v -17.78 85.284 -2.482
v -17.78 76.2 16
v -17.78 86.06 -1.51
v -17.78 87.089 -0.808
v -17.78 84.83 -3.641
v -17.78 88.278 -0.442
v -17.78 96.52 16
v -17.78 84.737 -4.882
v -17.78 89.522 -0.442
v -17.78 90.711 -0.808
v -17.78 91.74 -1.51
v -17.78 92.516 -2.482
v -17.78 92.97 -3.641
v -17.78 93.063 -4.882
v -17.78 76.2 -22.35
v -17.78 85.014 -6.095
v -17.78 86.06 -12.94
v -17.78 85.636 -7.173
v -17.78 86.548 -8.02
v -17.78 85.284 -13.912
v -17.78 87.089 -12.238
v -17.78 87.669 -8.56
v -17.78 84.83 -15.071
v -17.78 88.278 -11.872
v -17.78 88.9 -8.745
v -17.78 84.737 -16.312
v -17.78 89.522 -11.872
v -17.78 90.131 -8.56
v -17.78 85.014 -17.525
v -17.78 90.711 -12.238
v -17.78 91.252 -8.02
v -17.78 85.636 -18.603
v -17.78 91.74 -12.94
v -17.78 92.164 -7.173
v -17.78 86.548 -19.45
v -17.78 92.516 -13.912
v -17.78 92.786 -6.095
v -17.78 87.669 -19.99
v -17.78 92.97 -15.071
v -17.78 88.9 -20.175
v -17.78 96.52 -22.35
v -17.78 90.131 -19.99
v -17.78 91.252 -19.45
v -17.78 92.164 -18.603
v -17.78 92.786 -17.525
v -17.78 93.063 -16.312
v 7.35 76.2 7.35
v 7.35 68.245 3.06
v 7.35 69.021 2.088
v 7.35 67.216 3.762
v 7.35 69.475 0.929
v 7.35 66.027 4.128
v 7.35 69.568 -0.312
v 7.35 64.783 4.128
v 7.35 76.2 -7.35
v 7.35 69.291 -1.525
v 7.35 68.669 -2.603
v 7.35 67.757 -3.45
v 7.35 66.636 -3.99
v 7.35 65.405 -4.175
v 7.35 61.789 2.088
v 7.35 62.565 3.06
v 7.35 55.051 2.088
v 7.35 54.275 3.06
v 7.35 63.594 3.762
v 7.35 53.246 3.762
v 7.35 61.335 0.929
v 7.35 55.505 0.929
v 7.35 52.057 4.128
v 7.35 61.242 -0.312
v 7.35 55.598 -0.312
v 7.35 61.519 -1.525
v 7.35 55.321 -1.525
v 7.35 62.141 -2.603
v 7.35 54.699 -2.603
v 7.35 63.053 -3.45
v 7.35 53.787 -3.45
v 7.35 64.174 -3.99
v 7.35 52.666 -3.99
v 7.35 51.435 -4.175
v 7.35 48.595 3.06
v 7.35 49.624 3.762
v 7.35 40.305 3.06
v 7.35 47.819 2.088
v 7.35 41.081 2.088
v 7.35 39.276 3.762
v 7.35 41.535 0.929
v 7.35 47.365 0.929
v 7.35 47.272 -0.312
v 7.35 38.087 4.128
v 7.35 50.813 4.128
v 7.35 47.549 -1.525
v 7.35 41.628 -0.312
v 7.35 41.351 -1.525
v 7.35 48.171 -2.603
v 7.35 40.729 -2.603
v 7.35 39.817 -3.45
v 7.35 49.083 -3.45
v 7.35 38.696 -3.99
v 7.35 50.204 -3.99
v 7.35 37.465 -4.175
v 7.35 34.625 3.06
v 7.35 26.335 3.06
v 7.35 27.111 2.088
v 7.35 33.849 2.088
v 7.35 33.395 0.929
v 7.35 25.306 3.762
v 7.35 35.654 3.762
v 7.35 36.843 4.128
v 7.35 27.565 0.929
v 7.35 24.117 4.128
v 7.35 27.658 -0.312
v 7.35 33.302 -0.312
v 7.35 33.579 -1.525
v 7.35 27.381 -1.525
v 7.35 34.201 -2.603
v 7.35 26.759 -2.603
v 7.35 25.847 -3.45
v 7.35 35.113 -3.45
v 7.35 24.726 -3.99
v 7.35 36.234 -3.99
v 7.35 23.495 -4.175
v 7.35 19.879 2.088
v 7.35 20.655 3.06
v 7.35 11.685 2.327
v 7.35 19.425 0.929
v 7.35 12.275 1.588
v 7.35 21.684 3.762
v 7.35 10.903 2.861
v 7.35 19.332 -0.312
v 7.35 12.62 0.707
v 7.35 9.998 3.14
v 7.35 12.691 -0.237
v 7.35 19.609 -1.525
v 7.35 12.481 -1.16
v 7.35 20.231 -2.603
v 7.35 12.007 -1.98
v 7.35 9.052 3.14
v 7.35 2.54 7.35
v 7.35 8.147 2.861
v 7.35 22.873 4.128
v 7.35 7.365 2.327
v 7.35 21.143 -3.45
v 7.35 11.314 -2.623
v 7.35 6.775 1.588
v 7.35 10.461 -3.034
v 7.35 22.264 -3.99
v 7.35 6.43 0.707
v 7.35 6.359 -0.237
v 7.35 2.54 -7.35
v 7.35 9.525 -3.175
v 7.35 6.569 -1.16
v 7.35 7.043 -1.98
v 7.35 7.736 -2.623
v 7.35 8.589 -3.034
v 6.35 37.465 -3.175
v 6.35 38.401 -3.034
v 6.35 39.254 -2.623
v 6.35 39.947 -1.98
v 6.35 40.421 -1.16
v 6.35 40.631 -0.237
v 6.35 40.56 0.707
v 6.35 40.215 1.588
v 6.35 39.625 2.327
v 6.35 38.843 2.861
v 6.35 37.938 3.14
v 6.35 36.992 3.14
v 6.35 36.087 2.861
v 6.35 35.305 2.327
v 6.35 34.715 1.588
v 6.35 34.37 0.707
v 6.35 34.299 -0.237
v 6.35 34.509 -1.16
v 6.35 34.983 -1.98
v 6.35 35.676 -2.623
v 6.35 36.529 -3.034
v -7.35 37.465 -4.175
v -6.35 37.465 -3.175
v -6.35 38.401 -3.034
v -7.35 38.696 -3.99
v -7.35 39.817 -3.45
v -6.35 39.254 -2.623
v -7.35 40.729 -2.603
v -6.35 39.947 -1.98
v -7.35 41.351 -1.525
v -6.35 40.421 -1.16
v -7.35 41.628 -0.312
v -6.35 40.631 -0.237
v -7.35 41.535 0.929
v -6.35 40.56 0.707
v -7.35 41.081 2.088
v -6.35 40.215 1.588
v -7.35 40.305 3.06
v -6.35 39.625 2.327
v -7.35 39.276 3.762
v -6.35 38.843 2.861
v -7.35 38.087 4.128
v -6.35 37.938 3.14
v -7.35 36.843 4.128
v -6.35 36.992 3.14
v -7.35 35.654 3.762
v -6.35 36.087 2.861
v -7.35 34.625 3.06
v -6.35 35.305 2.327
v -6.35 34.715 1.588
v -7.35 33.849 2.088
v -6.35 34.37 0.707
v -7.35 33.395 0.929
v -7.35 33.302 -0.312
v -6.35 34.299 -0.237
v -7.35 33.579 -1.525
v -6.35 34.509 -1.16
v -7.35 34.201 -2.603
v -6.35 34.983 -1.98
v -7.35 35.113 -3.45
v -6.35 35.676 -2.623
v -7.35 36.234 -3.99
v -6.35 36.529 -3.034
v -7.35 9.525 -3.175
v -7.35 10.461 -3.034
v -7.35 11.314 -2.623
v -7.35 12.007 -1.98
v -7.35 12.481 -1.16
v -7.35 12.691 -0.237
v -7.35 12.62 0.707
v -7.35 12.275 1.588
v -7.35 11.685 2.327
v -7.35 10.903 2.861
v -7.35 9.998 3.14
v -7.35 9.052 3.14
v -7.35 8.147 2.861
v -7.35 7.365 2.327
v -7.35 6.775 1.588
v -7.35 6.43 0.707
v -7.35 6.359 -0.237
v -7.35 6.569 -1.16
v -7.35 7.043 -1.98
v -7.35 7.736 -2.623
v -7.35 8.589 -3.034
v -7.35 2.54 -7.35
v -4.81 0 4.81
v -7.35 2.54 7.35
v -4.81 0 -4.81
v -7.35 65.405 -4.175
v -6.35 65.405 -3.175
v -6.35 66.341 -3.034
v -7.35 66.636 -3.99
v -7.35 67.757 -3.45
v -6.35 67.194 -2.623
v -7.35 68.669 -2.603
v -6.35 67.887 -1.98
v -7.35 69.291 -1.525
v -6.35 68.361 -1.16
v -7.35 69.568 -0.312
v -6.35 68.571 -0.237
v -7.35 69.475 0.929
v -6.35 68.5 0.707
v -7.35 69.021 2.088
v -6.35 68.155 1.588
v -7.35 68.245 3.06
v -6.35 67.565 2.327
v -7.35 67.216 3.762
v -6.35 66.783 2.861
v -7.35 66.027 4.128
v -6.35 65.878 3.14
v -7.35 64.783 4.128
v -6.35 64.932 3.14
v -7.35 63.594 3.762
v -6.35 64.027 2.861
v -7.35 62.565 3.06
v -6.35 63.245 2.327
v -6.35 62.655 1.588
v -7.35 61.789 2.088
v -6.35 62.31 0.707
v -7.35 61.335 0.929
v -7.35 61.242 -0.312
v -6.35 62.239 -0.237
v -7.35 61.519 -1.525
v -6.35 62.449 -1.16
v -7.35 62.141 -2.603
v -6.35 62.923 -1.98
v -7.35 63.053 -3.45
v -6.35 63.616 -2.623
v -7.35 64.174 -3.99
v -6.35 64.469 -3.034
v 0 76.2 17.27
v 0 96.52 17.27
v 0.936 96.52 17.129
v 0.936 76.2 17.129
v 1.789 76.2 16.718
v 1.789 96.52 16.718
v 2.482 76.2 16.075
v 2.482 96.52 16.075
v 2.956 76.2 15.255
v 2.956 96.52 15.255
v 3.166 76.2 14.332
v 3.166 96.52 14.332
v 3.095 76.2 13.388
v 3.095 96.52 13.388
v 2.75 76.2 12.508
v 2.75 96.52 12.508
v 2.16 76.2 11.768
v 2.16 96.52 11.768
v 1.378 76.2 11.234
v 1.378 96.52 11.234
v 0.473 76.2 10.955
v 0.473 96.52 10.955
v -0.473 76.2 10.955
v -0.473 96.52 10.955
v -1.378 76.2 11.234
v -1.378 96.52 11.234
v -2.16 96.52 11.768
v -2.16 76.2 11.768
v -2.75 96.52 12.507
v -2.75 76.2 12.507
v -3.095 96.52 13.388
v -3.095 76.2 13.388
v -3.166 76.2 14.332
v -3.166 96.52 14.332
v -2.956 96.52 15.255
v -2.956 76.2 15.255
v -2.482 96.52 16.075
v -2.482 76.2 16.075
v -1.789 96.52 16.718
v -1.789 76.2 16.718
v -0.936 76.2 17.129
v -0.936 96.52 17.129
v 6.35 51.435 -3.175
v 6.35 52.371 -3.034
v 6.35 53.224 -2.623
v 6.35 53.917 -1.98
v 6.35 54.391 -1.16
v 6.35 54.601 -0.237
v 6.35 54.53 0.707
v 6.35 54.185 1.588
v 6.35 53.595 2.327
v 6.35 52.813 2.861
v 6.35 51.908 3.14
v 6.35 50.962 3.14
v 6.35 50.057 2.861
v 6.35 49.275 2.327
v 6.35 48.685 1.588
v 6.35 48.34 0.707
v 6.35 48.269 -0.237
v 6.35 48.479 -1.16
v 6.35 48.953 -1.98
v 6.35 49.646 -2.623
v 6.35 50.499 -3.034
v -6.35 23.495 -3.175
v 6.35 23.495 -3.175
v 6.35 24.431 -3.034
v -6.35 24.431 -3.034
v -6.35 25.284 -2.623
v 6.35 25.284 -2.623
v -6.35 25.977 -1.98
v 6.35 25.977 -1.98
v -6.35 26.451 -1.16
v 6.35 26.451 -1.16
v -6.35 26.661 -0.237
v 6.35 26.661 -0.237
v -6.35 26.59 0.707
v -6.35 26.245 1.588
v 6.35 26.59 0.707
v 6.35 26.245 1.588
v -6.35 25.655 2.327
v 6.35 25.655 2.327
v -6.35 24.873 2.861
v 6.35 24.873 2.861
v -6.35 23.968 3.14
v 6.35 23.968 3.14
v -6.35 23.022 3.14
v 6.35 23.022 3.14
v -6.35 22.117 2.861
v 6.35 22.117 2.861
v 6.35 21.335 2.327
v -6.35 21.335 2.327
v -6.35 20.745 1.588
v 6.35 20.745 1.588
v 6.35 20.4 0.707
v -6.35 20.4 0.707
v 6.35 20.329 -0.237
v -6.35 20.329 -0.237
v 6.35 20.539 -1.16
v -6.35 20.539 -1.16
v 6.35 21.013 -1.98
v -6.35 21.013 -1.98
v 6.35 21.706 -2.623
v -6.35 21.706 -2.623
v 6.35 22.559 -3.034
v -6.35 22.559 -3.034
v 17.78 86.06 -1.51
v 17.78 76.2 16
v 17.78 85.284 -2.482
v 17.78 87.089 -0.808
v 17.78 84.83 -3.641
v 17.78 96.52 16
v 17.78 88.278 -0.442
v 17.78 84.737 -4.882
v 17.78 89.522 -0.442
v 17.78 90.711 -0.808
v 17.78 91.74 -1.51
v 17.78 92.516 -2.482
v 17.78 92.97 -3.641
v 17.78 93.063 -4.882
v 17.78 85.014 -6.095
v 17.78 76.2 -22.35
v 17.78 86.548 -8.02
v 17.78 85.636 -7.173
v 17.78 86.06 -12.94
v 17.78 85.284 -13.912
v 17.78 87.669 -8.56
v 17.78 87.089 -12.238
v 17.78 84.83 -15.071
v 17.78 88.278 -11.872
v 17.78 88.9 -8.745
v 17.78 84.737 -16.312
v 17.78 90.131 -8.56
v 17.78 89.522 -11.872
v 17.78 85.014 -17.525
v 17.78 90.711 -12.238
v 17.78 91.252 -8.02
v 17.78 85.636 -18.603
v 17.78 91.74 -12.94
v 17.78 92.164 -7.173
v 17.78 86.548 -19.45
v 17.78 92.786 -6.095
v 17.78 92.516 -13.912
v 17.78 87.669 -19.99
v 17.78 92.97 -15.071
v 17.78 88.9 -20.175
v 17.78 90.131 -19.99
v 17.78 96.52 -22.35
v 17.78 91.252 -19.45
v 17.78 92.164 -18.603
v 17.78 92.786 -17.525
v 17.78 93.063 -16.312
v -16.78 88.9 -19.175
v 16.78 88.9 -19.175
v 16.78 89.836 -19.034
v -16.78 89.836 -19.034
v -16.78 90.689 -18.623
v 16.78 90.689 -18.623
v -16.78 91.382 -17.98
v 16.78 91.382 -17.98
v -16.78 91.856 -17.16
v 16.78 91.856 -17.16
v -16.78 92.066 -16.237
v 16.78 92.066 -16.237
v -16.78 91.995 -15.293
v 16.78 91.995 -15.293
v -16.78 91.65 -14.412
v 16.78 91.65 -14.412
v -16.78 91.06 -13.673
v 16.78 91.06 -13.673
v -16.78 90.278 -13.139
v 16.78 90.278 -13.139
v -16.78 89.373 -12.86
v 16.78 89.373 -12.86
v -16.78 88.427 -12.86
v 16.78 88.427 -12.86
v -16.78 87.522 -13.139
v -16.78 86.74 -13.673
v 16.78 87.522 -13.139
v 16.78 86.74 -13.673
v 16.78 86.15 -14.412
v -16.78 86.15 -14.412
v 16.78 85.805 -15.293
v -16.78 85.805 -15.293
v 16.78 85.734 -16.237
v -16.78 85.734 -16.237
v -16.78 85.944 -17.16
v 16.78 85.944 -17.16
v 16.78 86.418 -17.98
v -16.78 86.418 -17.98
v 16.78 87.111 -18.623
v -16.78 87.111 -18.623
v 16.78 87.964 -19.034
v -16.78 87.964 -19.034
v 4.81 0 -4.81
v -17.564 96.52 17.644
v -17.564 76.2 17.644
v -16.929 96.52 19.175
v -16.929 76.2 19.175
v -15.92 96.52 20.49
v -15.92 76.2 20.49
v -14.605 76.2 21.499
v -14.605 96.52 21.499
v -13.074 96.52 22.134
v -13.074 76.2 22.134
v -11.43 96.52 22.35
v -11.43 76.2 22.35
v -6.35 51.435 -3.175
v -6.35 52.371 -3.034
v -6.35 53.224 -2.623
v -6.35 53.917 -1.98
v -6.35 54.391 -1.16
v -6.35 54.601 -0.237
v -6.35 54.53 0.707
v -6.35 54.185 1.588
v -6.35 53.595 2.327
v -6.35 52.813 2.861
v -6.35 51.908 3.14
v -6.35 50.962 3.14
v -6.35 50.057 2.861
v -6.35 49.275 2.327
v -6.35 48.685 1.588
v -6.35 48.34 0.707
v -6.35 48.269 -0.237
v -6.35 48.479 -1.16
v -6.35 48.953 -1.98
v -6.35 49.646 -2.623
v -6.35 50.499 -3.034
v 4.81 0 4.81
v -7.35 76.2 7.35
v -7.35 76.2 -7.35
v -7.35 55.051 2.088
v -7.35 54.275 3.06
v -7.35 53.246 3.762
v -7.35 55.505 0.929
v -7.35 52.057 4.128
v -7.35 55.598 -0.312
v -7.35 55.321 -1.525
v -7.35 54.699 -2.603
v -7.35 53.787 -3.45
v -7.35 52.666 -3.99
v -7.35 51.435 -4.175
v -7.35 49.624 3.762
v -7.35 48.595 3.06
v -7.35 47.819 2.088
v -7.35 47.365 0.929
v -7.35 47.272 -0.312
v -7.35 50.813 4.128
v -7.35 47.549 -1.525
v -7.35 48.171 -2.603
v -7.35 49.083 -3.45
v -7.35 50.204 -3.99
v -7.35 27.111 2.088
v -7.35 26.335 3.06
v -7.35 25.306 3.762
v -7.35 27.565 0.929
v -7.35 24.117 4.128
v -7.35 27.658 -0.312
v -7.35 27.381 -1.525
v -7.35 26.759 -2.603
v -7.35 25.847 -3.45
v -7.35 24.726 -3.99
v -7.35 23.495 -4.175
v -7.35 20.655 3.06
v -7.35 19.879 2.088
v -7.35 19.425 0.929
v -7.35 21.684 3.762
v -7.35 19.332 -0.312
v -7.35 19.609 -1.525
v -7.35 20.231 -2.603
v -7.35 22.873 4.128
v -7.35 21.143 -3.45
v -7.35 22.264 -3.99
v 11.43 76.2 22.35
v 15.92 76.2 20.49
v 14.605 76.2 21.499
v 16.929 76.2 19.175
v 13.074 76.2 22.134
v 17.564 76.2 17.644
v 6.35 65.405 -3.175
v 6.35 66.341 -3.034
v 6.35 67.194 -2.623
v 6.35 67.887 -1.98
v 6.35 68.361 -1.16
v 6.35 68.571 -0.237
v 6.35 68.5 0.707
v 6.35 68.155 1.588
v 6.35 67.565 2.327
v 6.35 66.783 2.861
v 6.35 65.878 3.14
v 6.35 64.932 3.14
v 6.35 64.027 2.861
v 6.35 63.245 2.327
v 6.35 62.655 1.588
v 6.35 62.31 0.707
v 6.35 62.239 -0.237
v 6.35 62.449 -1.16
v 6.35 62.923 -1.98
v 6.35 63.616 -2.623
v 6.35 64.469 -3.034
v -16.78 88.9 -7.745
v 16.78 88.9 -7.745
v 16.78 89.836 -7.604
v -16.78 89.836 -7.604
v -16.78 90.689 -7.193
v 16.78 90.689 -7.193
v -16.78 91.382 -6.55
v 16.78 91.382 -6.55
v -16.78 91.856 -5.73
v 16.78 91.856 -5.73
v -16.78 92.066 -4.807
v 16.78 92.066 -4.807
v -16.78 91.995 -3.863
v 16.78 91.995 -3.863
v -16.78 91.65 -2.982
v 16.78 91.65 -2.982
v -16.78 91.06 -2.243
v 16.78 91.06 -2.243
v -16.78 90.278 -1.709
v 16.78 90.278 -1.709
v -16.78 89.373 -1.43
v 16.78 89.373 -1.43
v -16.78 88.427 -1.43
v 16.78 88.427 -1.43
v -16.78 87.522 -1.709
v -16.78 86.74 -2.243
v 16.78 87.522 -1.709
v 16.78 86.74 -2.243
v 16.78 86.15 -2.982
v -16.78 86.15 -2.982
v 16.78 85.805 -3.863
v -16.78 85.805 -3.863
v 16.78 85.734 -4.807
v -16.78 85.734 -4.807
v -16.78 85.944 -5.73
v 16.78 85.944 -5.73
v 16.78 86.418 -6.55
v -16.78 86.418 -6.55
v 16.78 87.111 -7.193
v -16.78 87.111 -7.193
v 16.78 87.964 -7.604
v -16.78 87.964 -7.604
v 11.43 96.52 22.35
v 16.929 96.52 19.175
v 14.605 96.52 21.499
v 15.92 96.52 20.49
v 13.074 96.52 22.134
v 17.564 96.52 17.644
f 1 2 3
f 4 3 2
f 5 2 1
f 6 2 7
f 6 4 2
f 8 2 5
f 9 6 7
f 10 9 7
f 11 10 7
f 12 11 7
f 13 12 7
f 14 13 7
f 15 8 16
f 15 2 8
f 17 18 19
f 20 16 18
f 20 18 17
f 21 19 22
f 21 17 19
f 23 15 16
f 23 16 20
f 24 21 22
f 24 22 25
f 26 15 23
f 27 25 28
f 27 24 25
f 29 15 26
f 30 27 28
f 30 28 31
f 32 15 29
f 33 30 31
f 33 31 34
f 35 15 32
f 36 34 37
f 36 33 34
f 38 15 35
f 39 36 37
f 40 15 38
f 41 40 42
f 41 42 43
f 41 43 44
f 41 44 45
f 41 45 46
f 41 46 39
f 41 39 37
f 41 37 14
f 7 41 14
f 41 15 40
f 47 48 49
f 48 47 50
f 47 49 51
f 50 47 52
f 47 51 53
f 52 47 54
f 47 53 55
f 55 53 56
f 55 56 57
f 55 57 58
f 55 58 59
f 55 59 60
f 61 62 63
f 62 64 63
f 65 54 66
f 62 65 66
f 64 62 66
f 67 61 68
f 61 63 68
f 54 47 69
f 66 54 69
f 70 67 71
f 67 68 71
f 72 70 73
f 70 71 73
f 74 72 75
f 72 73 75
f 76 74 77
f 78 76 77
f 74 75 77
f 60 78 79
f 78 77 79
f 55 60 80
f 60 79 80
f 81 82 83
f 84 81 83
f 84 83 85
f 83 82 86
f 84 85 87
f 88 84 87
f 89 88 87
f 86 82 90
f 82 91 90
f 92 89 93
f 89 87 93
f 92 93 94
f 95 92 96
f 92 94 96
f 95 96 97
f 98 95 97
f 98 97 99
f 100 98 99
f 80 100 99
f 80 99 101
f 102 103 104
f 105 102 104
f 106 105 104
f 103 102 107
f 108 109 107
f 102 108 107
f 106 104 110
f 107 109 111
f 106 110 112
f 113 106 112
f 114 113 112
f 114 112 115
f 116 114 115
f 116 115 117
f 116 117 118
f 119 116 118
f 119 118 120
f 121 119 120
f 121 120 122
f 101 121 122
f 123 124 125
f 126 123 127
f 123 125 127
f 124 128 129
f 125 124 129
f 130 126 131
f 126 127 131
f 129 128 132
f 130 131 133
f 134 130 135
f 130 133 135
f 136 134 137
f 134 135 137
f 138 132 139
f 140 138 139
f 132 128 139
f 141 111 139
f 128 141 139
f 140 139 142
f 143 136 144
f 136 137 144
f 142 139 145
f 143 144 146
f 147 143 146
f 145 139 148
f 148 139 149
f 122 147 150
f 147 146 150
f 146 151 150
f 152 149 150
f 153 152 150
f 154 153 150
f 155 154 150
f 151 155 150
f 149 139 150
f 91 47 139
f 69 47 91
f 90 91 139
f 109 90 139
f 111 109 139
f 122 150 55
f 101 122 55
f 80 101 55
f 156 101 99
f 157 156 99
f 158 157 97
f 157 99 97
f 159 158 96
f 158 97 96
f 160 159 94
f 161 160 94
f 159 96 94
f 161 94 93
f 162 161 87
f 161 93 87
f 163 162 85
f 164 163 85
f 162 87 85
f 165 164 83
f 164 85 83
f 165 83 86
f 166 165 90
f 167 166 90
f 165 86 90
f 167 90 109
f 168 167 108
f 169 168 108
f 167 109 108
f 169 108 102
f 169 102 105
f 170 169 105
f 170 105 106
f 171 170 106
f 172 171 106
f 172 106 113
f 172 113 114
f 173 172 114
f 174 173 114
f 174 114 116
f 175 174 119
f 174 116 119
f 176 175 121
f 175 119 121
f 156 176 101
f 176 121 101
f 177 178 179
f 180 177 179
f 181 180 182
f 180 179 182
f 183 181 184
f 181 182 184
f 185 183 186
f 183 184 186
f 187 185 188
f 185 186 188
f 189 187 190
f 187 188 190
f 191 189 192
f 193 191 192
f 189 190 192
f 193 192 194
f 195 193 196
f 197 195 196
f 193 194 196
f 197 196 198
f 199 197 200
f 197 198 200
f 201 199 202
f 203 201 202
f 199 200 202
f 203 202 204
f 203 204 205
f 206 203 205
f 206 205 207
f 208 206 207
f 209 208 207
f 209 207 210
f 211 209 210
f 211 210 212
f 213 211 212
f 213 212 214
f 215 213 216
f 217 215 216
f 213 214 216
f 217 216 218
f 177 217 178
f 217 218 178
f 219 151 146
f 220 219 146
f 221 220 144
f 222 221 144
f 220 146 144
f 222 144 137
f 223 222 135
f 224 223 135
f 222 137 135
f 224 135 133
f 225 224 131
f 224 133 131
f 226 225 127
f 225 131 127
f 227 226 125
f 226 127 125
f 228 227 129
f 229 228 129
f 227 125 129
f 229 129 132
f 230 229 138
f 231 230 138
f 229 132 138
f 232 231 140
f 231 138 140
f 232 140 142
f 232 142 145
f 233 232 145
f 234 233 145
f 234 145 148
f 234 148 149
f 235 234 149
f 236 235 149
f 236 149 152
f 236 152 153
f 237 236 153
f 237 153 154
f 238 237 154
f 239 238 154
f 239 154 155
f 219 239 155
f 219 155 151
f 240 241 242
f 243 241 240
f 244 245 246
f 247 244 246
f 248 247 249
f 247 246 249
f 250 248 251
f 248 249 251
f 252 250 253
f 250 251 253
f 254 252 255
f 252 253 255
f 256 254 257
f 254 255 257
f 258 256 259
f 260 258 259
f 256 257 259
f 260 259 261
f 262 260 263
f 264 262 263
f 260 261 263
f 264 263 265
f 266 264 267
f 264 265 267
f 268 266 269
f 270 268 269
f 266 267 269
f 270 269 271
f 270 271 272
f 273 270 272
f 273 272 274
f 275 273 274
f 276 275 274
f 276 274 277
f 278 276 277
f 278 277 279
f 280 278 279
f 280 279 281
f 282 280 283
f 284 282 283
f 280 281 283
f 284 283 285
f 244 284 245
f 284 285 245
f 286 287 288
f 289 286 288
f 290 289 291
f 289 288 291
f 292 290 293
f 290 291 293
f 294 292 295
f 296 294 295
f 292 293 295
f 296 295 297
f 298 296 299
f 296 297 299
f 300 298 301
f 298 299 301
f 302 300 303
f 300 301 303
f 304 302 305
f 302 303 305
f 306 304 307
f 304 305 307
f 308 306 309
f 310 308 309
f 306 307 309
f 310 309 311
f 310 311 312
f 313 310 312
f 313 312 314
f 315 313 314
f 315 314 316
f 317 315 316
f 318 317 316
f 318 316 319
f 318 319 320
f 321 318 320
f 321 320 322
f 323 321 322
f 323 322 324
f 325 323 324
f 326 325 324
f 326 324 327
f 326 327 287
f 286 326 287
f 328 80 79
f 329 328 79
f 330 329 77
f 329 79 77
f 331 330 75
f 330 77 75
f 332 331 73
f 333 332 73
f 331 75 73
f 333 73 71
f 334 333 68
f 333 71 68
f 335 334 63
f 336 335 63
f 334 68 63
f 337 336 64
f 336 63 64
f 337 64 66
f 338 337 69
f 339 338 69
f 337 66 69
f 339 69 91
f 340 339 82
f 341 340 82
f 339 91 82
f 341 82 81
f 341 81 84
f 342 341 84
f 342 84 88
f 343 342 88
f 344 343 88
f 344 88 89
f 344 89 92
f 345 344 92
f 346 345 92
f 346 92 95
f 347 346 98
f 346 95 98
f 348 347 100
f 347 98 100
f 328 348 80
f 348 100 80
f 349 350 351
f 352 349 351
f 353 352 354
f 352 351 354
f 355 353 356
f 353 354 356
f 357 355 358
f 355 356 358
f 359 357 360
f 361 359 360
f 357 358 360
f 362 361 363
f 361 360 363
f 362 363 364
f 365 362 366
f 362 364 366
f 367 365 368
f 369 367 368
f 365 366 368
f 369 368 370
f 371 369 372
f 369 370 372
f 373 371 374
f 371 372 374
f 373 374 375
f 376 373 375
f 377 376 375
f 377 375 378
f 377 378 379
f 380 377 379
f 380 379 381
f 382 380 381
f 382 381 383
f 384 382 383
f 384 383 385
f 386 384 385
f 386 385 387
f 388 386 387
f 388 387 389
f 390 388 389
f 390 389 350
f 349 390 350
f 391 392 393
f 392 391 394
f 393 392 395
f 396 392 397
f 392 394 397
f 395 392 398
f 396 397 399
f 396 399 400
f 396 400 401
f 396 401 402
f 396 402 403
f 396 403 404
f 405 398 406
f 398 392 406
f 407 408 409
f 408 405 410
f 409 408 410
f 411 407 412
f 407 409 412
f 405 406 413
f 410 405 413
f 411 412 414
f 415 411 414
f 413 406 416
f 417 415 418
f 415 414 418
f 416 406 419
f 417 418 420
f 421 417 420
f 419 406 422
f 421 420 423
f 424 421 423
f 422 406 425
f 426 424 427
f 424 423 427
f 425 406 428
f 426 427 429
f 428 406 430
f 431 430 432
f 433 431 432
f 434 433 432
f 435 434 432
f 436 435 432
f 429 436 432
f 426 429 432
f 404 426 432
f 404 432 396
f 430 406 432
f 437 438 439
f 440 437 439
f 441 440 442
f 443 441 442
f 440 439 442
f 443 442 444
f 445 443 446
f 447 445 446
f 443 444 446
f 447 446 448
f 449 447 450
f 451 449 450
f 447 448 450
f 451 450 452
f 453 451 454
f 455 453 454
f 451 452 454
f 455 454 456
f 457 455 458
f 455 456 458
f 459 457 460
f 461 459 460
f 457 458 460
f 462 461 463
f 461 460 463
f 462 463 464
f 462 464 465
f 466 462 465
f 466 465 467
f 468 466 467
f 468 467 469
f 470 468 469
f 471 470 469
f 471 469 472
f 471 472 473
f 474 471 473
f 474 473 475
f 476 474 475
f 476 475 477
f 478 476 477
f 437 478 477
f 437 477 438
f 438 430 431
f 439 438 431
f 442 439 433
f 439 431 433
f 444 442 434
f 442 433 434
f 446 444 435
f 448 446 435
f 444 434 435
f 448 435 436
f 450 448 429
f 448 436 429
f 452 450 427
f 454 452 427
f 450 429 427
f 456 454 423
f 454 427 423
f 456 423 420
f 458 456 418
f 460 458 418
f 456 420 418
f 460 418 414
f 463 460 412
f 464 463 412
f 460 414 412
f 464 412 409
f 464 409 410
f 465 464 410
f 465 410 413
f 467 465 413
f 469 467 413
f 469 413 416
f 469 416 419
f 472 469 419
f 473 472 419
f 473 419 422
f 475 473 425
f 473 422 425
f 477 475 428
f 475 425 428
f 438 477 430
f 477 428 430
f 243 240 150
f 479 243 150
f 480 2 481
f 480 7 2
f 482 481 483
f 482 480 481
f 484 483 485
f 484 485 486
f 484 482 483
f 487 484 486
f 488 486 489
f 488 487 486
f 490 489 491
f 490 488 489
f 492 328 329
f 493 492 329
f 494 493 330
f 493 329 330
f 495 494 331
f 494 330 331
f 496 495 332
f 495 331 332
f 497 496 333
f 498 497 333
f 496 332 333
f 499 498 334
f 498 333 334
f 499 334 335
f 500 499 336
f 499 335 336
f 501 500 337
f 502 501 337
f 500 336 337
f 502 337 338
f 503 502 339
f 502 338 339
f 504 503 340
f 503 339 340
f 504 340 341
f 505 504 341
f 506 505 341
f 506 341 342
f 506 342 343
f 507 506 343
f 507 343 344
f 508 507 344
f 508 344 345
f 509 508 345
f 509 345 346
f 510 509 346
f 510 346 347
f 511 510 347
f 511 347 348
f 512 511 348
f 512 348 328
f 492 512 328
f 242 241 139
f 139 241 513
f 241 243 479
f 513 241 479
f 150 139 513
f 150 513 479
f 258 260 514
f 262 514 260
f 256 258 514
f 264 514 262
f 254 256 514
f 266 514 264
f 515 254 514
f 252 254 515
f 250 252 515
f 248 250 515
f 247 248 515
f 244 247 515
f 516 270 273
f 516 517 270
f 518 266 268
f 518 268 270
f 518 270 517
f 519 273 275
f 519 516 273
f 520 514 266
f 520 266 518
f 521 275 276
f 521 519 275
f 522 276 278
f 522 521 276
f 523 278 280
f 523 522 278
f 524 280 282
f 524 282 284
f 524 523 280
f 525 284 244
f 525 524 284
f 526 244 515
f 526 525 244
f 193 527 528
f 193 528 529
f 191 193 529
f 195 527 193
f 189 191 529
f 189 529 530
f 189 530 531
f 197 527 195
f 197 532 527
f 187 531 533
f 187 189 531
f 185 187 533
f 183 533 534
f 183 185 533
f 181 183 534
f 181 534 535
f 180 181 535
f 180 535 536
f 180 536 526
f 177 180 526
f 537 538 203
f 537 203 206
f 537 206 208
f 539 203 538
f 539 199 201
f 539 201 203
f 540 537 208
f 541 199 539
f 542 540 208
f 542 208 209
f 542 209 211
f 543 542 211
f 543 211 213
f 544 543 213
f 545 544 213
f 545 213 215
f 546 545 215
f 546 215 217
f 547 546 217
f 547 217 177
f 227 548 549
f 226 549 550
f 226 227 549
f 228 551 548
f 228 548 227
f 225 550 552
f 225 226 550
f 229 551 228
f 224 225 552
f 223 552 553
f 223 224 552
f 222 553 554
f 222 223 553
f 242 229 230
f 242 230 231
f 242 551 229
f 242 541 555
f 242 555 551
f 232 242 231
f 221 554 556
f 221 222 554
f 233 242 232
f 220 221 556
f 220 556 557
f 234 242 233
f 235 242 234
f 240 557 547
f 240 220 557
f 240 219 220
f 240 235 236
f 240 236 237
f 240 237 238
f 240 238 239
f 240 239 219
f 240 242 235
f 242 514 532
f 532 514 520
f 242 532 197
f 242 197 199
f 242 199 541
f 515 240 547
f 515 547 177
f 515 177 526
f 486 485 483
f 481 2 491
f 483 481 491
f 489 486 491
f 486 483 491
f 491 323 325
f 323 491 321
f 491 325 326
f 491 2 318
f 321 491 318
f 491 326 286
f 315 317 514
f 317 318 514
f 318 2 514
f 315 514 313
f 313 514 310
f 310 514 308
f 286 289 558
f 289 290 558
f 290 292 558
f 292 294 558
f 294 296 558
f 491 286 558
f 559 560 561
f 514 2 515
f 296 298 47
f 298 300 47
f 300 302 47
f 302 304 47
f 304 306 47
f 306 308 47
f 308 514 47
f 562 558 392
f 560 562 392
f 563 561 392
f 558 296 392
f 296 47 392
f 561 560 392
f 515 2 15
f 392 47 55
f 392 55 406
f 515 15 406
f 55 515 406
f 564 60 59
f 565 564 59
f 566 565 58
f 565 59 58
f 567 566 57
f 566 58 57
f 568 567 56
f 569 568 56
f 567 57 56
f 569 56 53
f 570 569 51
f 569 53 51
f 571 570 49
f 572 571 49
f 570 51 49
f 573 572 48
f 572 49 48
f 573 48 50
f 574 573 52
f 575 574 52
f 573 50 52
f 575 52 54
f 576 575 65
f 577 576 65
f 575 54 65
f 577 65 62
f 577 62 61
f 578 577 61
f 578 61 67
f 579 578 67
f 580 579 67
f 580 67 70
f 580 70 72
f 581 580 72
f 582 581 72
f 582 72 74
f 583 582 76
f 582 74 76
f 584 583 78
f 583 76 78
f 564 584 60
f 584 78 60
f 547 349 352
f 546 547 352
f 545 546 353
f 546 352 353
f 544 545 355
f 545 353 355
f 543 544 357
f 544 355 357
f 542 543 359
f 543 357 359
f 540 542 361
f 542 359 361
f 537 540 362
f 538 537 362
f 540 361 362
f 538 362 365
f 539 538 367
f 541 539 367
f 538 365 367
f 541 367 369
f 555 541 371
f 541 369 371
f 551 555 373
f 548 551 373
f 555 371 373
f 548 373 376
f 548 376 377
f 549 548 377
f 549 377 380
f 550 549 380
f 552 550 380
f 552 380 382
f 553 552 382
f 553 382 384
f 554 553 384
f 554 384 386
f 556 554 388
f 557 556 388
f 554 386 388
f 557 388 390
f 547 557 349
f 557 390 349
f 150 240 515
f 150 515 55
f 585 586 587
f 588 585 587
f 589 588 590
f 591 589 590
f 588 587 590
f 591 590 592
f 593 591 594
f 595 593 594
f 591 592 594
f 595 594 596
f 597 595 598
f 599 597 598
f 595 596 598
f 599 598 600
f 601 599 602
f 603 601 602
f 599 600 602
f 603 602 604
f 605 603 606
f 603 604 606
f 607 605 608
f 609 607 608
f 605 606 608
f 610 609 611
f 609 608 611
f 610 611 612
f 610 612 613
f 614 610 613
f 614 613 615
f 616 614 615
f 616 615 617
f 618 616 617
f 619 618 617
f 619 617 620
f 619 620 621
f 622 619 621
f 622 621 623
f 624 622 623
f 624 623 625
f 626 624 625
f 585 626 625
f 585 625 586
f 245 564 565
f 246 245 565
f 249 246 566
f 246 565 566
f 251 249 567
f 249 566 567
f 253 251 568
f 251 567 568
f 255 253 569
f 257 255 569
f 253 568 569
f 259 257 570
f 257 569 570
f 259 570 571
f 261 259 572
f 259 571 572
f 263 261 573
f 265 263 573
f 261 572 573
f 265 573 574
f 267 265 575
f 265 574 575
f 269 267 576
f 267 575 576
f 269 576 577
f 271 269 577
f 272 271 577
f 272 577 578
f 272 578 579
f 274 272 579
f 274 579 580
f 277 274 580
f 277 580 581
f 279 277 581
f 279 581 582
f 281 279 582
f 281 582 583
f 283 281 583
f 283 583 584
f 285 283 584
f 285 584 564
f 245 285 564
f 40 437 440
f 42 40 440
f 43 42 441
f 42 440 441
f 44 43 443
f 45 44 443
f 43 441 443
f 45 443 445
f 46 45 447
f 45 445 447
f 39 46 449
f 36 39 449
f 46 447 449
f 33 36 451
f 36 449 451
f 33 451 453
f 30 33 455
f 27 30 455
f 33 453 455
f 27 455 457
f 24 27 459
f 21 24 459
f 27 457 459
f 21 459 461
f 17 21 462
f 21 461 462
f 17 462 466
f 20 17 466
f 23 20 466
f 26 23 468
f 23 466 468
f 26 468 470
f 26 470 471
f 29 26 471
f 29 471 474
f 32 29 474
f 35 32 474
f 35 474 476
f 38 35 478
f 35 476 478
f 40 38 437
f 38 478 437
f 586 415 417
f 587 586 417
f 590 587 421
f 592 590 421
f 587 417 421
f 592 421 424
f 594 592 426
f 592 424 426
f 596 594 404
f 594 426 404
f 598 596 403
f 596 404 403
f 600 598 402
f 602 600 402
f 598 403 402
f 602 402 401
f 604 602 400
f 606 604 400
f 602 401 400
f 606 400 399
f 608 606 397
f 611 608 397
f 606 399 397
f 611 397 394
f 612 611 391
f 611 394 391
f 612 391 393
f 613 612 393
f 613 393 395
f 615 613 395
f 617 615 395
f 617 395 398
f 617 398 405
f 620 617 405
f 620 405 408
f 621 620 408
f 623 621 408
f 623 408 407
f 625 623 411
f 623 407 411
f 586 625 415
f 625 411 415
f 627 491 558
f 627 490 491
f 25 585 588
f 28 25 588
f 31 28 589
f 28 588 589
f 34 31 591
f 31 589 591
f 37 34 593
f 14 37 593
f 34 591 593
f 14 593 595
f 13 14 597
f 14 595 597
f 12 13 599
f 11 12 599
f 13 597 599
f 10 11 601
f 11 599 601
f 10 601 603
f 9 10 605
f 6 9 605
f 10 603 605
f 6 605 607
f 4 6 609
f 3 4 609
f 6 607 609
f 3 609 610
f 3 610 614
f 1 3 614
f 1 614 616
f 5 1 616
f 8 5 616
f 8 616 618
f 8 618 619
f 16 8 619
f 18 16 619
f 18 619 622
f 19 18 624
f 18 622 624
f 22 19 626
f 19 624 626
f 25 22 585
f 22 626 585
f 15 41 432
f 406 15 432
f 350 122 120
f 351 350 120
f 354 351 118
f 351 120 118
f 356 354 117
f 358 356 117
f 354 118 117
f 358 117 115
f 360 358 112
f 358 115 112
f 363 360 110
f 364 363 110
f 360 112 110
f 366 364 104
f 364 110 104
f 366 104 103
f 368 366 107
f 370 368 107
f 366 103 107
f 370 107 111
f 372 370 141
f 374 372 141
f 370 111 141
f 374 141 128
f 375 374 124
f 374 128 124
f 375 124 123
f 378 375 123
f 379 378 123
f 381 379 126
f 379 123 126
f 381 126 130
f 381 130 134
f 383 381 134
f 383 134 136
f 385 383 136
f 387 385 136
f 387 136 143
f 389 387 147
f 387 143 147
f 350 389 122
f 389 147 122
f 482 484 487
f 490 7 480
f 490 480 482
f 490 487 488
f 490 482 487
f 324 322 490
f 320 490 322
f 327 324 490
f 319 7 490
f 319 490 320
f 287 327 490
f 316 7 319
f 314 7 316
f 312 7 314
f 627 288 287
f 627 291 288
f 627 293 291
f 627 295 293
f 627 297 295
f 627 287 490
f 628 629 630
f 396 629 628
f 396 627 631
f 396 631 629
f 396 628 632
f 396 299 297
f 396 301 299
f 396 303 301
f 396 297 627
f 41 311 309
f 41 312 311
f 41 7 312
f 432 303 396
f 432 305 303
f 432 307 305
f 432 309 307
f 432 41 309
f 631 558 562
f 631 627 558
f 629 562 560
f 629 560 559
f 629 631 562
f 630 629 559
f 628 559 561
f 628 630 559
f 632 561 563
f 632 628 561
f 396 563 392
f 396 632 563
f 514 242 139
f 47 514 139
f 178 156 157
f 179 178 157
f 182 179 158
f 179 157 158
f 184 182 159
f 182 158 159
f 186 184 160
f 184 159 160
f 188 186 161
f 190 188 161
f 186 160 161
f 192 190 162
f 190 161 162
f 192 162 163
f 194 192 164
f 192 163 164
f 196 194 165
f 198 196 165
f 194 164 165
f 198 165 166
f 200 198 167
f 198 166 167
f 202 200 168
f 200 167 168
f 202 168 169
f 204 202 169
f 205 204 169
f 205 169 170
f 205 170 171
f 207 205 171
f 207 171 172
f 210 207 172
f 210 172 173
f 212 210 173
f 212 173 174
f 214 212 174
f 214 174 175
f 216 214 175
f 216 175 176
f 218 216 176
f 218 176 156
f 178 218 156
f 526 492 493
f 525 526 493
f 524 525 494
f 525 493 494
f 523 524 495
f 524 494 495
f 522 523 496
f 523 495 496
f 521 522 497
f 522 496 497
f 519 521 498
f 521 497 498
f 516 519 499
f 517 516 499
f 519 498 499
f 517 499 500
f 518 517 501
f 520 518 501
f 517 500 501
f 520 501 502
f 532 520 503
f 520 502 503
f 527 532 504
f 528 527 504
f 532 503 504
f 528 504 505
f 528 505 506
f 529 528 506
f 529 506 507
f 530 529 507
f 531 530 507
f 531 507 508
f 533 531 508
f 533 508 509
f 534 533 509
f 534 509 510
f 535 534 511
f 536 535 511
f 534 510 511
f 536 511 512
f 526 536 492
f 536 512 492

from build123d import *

# Parameters (mm, degrees)
SKETCH1_W                 = 14.7
SKETCH1_H                 = 14.7
BOSS_EXTRUDE1_DEPTH       = 76.2
SKETCH6_R                 = 3.175
CUT_EXTRUDE4_DEPTH        = 78.952244997
CHAMFER5_SIZE             = 1
CHAMFER6_SIZE             = 2.54
BOSS_EXTRUDE2_DEPTH       = 15
BOSS_EXTRUDE2_DEPTH_BACK  = 29.7
SKETCH4_W                 = 35.56
SKETCH4_H                 = 20.32
SKETCH5_R                 = 3.175
TRAYSUPPORTMOUNTING_DEPTH = 106.262274819
CHAMFER4_SIZE             = 1
CUT_EXTRUDE2_REACH        = 102.657
SKETCH3_R                 = 3.175
FILLET1_R                 = 6.35


with BuildPart() as part:
    # Sketch1 → Boss-Extrude1 (new body)
    with BuildSketch(Plane(origin=(0, 0, 0), x_dir=(1, 0, 0), z_dir=(0, 1, 0))):
        Rectangle(SKETCH1_W, SKETCH1_H)
    extrude(amount=BOSS_EXTRUDE1_DEPTH)

    # Sketch6 → Cut-Extrude4 (cut, through all)
    with BuildSketch(Plane(origin=(7.35, 0, 0), x_dir=(0, 0, -1), z_dir=(1, 0, 0))):
        with Locations((0, 65.405)):
            Circle(SKETCH6_R)
        with Locations((0, 51.435)):
            Circle(SKETCH6_R)
        with Locations((0, 37.465)):
            Circle(SKETCH6_R)
        with Locations((0, 23.495)):
            Circle(SKETCH6_R)
        with Locations((0, 9.525)):
            Circle(SKETCH6_R)
    extrude(amount=-CUT_EXTRUDE4_DEPTH, mode=Mode.SUBTRACT)

    # Chamfer5
    chamfer5_edges = [part.edges().sort_by_distance(p)[0] for p in [
        (-7.35, 23.495, 3.175),
        (7.35, 23.495, 3.175),
        (-7.35, 37.465, 3.175),
        (7.35, 37.465, 3.175),
        (-7.35, 51.435, 3.175),
        (7.35, 51.435, 3.175),
        (-7.35, 65.405, 3.175),
        (7.35, 65.405, 3.175),
    ]]
    chamfer(chamfer5_edges, length=CHAMFER5_SIZE)

    # Chamfer6
    chamfer6_edges = [part.edges().sort_by_distance(p)[0] for p in [
        (0, 0, 7.35),
        (7.35, 0, 0),
        (0, 0, -7.35),
        (-7.35, 0, 0),
    ]]
    chamfer(chamfer6_edges, length=CHAMFER6_SIZE)

    # Sketch4 → Boss-Extrude2 (add, two sides: drawn at the far end of the back side and taken through both)
    with BuildSketch(Plane.XY.offset(7.35).offset(-BOSS_EXTRUDE2_DEPTH_BACK)):
        with Locations((0, 86.36)):
            Rectangle(SKETCH4_W, SKETCH4_H)
    extrude(amount=BOSS_EXTRUDE2_DEPTH + BOSS_EXTRUDE2_DEPTH_BACK)

    # Sketch5 → TraySupportMounting (cut, through all)
    with BuildSketch(Plane(origin=(17.78, 0, 0), x_dir=(0, 0, -1), z_dir=(1, 0, 0))):
        with Locations((16, 88.9)):
            Circle(SKETCH5_R)
        with Locations((4.57, 88.9)):
            Circle(SKETCH5_R)
    extrude(amount=-TRAYSUPPORTMOUNTING_DEPTH, mode=Mode.SUBTRACT)

    # Chamfer4
    chamfer4_edges = [part.edges().sort_by_distance(p)[0] for p in [
        (17.78, 88.9, -1.395),
        (-17.78, 88.9, -1.395),
        (17.78, 88.9, -12.825),
        (-17.78, 88.9, -12.825),
    ]]
    chamfer(chamfer4_edges, length=CHAMFER4_SIZE)

    # Sketch3 → Cut-Extrude2 (cut, up to next)
    with BuildSketch(Plane(origin=(0, 96.52, 0), x_dir=(1, 0, 0), z_dir=(0, 1, 0)), mode=Mode.PRIVATE) as cut_extrude2_sk1:
        with Locations((0, -14.095)):
            Circle(SKETCH3_R)
    cut_extrude2_tool1 = extrude(cut_extrude2_sk1.sketch, amount=-CUT_EXTRUDE2_REACH, mode=Mode.PRIVATE) & part.part
    add(cut_extrude2_tool1.solids().sort_by_distance((0, 96.52, 14.095))[0], mode=Mode.SUBTRACT)

    # Fillet1
    fillet1_edges = [part.edges().sort_by_distance(p)[0] for p in [
        (-17.78, 86.36, 22.35),
        (17.78, 86.36, 22.35),
    ]]
    fillet(fillet1_edges, radius=FILLET1_R)


solid = part.part
